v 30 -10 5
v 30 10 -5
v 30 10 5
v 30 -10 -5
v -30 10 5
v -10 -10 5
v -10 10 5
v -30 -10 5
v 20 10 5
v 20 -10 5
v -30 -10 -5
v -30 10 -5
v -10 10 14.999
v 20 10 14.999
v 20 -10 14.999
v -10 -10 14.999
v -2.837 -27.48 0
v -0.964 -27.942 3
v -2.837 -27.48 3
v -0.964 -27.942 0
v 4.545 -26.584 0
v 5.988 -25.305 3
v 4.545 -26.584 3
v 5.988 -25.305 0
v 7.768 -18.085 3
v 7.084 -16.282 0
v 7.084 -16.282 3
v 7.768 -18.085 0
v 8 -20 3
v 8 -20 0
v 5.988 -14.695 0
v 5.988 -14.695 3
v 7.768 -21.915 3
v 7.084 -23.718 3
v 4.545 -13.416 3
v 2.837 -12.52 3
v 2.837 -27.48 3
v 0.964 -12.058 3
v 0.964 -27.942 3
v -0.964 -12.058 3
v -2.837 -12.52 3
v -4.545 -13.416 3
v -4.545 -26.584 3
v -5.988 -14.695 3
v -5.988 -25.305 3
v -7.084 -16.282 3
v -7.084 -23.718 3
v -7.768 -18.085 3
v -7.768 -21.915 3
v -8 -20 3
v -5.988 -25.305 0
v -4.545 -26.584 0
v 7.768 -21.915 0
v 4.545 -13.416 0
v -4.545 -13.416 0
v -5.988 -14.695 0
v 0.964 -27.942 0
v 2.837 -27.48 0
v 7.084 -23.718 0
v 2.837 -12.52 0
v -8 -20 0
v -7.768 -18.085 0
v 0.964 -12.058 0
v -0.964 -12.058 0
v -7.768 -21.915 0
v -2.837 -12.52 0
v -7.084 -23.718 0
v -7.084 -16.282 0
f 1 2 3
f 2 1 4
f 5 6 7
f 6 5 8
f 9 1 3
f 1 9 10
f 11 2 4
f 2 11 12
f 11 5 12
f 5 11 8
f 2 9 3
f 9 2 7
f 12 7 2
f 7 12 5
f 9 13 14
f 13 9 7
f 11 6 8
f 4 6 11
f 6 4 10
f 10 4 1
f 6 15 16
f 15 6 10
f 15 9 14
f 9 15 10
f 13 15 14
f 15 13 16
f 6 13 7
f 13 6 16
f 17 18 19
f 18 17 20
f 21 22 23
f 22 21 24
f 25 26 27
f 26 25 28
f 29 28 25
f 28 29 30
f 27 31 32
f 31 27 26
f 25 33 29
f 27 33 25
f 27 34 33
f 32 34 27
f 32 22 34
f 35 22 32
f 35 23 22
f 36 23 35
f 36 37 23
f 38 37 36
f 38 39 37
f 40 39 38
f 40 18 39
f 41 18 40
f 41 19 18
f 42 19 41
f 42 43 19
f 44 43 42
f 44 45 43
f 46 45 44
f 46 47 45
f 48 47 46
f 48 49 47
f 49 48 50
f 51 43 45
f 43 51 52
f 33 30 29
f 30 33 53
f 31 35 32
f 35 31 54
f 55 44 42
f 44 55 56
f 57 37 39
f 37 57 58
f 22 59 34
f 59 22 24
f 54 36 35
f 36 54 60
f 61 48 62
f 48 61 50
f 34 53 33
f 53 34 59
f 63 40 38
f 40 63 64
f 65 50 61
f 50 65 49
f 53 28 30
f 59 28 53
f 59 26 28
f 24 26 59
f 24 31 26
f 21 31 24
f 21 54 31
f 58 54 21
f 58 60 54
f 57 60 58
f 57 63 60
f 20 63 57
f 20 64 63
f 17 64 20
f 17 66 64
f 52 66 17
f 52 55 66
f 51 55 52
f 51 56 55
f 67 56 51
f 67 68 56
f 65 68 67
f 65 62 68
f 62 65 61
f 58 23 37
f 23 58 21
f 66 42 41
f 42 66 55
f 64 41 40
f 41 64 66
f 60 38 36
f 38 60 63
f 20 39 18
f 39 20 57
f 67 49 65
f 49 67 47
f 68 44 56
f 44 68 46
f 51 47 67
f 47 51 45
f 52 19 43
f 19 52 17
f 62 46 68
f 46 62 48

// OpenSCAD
cube([60,20,10],true);
translate([5,0,10-0.001])
    cube([30,20,10],true);
translate([0,-20,0])
    cylinder(h=3,r=8);
